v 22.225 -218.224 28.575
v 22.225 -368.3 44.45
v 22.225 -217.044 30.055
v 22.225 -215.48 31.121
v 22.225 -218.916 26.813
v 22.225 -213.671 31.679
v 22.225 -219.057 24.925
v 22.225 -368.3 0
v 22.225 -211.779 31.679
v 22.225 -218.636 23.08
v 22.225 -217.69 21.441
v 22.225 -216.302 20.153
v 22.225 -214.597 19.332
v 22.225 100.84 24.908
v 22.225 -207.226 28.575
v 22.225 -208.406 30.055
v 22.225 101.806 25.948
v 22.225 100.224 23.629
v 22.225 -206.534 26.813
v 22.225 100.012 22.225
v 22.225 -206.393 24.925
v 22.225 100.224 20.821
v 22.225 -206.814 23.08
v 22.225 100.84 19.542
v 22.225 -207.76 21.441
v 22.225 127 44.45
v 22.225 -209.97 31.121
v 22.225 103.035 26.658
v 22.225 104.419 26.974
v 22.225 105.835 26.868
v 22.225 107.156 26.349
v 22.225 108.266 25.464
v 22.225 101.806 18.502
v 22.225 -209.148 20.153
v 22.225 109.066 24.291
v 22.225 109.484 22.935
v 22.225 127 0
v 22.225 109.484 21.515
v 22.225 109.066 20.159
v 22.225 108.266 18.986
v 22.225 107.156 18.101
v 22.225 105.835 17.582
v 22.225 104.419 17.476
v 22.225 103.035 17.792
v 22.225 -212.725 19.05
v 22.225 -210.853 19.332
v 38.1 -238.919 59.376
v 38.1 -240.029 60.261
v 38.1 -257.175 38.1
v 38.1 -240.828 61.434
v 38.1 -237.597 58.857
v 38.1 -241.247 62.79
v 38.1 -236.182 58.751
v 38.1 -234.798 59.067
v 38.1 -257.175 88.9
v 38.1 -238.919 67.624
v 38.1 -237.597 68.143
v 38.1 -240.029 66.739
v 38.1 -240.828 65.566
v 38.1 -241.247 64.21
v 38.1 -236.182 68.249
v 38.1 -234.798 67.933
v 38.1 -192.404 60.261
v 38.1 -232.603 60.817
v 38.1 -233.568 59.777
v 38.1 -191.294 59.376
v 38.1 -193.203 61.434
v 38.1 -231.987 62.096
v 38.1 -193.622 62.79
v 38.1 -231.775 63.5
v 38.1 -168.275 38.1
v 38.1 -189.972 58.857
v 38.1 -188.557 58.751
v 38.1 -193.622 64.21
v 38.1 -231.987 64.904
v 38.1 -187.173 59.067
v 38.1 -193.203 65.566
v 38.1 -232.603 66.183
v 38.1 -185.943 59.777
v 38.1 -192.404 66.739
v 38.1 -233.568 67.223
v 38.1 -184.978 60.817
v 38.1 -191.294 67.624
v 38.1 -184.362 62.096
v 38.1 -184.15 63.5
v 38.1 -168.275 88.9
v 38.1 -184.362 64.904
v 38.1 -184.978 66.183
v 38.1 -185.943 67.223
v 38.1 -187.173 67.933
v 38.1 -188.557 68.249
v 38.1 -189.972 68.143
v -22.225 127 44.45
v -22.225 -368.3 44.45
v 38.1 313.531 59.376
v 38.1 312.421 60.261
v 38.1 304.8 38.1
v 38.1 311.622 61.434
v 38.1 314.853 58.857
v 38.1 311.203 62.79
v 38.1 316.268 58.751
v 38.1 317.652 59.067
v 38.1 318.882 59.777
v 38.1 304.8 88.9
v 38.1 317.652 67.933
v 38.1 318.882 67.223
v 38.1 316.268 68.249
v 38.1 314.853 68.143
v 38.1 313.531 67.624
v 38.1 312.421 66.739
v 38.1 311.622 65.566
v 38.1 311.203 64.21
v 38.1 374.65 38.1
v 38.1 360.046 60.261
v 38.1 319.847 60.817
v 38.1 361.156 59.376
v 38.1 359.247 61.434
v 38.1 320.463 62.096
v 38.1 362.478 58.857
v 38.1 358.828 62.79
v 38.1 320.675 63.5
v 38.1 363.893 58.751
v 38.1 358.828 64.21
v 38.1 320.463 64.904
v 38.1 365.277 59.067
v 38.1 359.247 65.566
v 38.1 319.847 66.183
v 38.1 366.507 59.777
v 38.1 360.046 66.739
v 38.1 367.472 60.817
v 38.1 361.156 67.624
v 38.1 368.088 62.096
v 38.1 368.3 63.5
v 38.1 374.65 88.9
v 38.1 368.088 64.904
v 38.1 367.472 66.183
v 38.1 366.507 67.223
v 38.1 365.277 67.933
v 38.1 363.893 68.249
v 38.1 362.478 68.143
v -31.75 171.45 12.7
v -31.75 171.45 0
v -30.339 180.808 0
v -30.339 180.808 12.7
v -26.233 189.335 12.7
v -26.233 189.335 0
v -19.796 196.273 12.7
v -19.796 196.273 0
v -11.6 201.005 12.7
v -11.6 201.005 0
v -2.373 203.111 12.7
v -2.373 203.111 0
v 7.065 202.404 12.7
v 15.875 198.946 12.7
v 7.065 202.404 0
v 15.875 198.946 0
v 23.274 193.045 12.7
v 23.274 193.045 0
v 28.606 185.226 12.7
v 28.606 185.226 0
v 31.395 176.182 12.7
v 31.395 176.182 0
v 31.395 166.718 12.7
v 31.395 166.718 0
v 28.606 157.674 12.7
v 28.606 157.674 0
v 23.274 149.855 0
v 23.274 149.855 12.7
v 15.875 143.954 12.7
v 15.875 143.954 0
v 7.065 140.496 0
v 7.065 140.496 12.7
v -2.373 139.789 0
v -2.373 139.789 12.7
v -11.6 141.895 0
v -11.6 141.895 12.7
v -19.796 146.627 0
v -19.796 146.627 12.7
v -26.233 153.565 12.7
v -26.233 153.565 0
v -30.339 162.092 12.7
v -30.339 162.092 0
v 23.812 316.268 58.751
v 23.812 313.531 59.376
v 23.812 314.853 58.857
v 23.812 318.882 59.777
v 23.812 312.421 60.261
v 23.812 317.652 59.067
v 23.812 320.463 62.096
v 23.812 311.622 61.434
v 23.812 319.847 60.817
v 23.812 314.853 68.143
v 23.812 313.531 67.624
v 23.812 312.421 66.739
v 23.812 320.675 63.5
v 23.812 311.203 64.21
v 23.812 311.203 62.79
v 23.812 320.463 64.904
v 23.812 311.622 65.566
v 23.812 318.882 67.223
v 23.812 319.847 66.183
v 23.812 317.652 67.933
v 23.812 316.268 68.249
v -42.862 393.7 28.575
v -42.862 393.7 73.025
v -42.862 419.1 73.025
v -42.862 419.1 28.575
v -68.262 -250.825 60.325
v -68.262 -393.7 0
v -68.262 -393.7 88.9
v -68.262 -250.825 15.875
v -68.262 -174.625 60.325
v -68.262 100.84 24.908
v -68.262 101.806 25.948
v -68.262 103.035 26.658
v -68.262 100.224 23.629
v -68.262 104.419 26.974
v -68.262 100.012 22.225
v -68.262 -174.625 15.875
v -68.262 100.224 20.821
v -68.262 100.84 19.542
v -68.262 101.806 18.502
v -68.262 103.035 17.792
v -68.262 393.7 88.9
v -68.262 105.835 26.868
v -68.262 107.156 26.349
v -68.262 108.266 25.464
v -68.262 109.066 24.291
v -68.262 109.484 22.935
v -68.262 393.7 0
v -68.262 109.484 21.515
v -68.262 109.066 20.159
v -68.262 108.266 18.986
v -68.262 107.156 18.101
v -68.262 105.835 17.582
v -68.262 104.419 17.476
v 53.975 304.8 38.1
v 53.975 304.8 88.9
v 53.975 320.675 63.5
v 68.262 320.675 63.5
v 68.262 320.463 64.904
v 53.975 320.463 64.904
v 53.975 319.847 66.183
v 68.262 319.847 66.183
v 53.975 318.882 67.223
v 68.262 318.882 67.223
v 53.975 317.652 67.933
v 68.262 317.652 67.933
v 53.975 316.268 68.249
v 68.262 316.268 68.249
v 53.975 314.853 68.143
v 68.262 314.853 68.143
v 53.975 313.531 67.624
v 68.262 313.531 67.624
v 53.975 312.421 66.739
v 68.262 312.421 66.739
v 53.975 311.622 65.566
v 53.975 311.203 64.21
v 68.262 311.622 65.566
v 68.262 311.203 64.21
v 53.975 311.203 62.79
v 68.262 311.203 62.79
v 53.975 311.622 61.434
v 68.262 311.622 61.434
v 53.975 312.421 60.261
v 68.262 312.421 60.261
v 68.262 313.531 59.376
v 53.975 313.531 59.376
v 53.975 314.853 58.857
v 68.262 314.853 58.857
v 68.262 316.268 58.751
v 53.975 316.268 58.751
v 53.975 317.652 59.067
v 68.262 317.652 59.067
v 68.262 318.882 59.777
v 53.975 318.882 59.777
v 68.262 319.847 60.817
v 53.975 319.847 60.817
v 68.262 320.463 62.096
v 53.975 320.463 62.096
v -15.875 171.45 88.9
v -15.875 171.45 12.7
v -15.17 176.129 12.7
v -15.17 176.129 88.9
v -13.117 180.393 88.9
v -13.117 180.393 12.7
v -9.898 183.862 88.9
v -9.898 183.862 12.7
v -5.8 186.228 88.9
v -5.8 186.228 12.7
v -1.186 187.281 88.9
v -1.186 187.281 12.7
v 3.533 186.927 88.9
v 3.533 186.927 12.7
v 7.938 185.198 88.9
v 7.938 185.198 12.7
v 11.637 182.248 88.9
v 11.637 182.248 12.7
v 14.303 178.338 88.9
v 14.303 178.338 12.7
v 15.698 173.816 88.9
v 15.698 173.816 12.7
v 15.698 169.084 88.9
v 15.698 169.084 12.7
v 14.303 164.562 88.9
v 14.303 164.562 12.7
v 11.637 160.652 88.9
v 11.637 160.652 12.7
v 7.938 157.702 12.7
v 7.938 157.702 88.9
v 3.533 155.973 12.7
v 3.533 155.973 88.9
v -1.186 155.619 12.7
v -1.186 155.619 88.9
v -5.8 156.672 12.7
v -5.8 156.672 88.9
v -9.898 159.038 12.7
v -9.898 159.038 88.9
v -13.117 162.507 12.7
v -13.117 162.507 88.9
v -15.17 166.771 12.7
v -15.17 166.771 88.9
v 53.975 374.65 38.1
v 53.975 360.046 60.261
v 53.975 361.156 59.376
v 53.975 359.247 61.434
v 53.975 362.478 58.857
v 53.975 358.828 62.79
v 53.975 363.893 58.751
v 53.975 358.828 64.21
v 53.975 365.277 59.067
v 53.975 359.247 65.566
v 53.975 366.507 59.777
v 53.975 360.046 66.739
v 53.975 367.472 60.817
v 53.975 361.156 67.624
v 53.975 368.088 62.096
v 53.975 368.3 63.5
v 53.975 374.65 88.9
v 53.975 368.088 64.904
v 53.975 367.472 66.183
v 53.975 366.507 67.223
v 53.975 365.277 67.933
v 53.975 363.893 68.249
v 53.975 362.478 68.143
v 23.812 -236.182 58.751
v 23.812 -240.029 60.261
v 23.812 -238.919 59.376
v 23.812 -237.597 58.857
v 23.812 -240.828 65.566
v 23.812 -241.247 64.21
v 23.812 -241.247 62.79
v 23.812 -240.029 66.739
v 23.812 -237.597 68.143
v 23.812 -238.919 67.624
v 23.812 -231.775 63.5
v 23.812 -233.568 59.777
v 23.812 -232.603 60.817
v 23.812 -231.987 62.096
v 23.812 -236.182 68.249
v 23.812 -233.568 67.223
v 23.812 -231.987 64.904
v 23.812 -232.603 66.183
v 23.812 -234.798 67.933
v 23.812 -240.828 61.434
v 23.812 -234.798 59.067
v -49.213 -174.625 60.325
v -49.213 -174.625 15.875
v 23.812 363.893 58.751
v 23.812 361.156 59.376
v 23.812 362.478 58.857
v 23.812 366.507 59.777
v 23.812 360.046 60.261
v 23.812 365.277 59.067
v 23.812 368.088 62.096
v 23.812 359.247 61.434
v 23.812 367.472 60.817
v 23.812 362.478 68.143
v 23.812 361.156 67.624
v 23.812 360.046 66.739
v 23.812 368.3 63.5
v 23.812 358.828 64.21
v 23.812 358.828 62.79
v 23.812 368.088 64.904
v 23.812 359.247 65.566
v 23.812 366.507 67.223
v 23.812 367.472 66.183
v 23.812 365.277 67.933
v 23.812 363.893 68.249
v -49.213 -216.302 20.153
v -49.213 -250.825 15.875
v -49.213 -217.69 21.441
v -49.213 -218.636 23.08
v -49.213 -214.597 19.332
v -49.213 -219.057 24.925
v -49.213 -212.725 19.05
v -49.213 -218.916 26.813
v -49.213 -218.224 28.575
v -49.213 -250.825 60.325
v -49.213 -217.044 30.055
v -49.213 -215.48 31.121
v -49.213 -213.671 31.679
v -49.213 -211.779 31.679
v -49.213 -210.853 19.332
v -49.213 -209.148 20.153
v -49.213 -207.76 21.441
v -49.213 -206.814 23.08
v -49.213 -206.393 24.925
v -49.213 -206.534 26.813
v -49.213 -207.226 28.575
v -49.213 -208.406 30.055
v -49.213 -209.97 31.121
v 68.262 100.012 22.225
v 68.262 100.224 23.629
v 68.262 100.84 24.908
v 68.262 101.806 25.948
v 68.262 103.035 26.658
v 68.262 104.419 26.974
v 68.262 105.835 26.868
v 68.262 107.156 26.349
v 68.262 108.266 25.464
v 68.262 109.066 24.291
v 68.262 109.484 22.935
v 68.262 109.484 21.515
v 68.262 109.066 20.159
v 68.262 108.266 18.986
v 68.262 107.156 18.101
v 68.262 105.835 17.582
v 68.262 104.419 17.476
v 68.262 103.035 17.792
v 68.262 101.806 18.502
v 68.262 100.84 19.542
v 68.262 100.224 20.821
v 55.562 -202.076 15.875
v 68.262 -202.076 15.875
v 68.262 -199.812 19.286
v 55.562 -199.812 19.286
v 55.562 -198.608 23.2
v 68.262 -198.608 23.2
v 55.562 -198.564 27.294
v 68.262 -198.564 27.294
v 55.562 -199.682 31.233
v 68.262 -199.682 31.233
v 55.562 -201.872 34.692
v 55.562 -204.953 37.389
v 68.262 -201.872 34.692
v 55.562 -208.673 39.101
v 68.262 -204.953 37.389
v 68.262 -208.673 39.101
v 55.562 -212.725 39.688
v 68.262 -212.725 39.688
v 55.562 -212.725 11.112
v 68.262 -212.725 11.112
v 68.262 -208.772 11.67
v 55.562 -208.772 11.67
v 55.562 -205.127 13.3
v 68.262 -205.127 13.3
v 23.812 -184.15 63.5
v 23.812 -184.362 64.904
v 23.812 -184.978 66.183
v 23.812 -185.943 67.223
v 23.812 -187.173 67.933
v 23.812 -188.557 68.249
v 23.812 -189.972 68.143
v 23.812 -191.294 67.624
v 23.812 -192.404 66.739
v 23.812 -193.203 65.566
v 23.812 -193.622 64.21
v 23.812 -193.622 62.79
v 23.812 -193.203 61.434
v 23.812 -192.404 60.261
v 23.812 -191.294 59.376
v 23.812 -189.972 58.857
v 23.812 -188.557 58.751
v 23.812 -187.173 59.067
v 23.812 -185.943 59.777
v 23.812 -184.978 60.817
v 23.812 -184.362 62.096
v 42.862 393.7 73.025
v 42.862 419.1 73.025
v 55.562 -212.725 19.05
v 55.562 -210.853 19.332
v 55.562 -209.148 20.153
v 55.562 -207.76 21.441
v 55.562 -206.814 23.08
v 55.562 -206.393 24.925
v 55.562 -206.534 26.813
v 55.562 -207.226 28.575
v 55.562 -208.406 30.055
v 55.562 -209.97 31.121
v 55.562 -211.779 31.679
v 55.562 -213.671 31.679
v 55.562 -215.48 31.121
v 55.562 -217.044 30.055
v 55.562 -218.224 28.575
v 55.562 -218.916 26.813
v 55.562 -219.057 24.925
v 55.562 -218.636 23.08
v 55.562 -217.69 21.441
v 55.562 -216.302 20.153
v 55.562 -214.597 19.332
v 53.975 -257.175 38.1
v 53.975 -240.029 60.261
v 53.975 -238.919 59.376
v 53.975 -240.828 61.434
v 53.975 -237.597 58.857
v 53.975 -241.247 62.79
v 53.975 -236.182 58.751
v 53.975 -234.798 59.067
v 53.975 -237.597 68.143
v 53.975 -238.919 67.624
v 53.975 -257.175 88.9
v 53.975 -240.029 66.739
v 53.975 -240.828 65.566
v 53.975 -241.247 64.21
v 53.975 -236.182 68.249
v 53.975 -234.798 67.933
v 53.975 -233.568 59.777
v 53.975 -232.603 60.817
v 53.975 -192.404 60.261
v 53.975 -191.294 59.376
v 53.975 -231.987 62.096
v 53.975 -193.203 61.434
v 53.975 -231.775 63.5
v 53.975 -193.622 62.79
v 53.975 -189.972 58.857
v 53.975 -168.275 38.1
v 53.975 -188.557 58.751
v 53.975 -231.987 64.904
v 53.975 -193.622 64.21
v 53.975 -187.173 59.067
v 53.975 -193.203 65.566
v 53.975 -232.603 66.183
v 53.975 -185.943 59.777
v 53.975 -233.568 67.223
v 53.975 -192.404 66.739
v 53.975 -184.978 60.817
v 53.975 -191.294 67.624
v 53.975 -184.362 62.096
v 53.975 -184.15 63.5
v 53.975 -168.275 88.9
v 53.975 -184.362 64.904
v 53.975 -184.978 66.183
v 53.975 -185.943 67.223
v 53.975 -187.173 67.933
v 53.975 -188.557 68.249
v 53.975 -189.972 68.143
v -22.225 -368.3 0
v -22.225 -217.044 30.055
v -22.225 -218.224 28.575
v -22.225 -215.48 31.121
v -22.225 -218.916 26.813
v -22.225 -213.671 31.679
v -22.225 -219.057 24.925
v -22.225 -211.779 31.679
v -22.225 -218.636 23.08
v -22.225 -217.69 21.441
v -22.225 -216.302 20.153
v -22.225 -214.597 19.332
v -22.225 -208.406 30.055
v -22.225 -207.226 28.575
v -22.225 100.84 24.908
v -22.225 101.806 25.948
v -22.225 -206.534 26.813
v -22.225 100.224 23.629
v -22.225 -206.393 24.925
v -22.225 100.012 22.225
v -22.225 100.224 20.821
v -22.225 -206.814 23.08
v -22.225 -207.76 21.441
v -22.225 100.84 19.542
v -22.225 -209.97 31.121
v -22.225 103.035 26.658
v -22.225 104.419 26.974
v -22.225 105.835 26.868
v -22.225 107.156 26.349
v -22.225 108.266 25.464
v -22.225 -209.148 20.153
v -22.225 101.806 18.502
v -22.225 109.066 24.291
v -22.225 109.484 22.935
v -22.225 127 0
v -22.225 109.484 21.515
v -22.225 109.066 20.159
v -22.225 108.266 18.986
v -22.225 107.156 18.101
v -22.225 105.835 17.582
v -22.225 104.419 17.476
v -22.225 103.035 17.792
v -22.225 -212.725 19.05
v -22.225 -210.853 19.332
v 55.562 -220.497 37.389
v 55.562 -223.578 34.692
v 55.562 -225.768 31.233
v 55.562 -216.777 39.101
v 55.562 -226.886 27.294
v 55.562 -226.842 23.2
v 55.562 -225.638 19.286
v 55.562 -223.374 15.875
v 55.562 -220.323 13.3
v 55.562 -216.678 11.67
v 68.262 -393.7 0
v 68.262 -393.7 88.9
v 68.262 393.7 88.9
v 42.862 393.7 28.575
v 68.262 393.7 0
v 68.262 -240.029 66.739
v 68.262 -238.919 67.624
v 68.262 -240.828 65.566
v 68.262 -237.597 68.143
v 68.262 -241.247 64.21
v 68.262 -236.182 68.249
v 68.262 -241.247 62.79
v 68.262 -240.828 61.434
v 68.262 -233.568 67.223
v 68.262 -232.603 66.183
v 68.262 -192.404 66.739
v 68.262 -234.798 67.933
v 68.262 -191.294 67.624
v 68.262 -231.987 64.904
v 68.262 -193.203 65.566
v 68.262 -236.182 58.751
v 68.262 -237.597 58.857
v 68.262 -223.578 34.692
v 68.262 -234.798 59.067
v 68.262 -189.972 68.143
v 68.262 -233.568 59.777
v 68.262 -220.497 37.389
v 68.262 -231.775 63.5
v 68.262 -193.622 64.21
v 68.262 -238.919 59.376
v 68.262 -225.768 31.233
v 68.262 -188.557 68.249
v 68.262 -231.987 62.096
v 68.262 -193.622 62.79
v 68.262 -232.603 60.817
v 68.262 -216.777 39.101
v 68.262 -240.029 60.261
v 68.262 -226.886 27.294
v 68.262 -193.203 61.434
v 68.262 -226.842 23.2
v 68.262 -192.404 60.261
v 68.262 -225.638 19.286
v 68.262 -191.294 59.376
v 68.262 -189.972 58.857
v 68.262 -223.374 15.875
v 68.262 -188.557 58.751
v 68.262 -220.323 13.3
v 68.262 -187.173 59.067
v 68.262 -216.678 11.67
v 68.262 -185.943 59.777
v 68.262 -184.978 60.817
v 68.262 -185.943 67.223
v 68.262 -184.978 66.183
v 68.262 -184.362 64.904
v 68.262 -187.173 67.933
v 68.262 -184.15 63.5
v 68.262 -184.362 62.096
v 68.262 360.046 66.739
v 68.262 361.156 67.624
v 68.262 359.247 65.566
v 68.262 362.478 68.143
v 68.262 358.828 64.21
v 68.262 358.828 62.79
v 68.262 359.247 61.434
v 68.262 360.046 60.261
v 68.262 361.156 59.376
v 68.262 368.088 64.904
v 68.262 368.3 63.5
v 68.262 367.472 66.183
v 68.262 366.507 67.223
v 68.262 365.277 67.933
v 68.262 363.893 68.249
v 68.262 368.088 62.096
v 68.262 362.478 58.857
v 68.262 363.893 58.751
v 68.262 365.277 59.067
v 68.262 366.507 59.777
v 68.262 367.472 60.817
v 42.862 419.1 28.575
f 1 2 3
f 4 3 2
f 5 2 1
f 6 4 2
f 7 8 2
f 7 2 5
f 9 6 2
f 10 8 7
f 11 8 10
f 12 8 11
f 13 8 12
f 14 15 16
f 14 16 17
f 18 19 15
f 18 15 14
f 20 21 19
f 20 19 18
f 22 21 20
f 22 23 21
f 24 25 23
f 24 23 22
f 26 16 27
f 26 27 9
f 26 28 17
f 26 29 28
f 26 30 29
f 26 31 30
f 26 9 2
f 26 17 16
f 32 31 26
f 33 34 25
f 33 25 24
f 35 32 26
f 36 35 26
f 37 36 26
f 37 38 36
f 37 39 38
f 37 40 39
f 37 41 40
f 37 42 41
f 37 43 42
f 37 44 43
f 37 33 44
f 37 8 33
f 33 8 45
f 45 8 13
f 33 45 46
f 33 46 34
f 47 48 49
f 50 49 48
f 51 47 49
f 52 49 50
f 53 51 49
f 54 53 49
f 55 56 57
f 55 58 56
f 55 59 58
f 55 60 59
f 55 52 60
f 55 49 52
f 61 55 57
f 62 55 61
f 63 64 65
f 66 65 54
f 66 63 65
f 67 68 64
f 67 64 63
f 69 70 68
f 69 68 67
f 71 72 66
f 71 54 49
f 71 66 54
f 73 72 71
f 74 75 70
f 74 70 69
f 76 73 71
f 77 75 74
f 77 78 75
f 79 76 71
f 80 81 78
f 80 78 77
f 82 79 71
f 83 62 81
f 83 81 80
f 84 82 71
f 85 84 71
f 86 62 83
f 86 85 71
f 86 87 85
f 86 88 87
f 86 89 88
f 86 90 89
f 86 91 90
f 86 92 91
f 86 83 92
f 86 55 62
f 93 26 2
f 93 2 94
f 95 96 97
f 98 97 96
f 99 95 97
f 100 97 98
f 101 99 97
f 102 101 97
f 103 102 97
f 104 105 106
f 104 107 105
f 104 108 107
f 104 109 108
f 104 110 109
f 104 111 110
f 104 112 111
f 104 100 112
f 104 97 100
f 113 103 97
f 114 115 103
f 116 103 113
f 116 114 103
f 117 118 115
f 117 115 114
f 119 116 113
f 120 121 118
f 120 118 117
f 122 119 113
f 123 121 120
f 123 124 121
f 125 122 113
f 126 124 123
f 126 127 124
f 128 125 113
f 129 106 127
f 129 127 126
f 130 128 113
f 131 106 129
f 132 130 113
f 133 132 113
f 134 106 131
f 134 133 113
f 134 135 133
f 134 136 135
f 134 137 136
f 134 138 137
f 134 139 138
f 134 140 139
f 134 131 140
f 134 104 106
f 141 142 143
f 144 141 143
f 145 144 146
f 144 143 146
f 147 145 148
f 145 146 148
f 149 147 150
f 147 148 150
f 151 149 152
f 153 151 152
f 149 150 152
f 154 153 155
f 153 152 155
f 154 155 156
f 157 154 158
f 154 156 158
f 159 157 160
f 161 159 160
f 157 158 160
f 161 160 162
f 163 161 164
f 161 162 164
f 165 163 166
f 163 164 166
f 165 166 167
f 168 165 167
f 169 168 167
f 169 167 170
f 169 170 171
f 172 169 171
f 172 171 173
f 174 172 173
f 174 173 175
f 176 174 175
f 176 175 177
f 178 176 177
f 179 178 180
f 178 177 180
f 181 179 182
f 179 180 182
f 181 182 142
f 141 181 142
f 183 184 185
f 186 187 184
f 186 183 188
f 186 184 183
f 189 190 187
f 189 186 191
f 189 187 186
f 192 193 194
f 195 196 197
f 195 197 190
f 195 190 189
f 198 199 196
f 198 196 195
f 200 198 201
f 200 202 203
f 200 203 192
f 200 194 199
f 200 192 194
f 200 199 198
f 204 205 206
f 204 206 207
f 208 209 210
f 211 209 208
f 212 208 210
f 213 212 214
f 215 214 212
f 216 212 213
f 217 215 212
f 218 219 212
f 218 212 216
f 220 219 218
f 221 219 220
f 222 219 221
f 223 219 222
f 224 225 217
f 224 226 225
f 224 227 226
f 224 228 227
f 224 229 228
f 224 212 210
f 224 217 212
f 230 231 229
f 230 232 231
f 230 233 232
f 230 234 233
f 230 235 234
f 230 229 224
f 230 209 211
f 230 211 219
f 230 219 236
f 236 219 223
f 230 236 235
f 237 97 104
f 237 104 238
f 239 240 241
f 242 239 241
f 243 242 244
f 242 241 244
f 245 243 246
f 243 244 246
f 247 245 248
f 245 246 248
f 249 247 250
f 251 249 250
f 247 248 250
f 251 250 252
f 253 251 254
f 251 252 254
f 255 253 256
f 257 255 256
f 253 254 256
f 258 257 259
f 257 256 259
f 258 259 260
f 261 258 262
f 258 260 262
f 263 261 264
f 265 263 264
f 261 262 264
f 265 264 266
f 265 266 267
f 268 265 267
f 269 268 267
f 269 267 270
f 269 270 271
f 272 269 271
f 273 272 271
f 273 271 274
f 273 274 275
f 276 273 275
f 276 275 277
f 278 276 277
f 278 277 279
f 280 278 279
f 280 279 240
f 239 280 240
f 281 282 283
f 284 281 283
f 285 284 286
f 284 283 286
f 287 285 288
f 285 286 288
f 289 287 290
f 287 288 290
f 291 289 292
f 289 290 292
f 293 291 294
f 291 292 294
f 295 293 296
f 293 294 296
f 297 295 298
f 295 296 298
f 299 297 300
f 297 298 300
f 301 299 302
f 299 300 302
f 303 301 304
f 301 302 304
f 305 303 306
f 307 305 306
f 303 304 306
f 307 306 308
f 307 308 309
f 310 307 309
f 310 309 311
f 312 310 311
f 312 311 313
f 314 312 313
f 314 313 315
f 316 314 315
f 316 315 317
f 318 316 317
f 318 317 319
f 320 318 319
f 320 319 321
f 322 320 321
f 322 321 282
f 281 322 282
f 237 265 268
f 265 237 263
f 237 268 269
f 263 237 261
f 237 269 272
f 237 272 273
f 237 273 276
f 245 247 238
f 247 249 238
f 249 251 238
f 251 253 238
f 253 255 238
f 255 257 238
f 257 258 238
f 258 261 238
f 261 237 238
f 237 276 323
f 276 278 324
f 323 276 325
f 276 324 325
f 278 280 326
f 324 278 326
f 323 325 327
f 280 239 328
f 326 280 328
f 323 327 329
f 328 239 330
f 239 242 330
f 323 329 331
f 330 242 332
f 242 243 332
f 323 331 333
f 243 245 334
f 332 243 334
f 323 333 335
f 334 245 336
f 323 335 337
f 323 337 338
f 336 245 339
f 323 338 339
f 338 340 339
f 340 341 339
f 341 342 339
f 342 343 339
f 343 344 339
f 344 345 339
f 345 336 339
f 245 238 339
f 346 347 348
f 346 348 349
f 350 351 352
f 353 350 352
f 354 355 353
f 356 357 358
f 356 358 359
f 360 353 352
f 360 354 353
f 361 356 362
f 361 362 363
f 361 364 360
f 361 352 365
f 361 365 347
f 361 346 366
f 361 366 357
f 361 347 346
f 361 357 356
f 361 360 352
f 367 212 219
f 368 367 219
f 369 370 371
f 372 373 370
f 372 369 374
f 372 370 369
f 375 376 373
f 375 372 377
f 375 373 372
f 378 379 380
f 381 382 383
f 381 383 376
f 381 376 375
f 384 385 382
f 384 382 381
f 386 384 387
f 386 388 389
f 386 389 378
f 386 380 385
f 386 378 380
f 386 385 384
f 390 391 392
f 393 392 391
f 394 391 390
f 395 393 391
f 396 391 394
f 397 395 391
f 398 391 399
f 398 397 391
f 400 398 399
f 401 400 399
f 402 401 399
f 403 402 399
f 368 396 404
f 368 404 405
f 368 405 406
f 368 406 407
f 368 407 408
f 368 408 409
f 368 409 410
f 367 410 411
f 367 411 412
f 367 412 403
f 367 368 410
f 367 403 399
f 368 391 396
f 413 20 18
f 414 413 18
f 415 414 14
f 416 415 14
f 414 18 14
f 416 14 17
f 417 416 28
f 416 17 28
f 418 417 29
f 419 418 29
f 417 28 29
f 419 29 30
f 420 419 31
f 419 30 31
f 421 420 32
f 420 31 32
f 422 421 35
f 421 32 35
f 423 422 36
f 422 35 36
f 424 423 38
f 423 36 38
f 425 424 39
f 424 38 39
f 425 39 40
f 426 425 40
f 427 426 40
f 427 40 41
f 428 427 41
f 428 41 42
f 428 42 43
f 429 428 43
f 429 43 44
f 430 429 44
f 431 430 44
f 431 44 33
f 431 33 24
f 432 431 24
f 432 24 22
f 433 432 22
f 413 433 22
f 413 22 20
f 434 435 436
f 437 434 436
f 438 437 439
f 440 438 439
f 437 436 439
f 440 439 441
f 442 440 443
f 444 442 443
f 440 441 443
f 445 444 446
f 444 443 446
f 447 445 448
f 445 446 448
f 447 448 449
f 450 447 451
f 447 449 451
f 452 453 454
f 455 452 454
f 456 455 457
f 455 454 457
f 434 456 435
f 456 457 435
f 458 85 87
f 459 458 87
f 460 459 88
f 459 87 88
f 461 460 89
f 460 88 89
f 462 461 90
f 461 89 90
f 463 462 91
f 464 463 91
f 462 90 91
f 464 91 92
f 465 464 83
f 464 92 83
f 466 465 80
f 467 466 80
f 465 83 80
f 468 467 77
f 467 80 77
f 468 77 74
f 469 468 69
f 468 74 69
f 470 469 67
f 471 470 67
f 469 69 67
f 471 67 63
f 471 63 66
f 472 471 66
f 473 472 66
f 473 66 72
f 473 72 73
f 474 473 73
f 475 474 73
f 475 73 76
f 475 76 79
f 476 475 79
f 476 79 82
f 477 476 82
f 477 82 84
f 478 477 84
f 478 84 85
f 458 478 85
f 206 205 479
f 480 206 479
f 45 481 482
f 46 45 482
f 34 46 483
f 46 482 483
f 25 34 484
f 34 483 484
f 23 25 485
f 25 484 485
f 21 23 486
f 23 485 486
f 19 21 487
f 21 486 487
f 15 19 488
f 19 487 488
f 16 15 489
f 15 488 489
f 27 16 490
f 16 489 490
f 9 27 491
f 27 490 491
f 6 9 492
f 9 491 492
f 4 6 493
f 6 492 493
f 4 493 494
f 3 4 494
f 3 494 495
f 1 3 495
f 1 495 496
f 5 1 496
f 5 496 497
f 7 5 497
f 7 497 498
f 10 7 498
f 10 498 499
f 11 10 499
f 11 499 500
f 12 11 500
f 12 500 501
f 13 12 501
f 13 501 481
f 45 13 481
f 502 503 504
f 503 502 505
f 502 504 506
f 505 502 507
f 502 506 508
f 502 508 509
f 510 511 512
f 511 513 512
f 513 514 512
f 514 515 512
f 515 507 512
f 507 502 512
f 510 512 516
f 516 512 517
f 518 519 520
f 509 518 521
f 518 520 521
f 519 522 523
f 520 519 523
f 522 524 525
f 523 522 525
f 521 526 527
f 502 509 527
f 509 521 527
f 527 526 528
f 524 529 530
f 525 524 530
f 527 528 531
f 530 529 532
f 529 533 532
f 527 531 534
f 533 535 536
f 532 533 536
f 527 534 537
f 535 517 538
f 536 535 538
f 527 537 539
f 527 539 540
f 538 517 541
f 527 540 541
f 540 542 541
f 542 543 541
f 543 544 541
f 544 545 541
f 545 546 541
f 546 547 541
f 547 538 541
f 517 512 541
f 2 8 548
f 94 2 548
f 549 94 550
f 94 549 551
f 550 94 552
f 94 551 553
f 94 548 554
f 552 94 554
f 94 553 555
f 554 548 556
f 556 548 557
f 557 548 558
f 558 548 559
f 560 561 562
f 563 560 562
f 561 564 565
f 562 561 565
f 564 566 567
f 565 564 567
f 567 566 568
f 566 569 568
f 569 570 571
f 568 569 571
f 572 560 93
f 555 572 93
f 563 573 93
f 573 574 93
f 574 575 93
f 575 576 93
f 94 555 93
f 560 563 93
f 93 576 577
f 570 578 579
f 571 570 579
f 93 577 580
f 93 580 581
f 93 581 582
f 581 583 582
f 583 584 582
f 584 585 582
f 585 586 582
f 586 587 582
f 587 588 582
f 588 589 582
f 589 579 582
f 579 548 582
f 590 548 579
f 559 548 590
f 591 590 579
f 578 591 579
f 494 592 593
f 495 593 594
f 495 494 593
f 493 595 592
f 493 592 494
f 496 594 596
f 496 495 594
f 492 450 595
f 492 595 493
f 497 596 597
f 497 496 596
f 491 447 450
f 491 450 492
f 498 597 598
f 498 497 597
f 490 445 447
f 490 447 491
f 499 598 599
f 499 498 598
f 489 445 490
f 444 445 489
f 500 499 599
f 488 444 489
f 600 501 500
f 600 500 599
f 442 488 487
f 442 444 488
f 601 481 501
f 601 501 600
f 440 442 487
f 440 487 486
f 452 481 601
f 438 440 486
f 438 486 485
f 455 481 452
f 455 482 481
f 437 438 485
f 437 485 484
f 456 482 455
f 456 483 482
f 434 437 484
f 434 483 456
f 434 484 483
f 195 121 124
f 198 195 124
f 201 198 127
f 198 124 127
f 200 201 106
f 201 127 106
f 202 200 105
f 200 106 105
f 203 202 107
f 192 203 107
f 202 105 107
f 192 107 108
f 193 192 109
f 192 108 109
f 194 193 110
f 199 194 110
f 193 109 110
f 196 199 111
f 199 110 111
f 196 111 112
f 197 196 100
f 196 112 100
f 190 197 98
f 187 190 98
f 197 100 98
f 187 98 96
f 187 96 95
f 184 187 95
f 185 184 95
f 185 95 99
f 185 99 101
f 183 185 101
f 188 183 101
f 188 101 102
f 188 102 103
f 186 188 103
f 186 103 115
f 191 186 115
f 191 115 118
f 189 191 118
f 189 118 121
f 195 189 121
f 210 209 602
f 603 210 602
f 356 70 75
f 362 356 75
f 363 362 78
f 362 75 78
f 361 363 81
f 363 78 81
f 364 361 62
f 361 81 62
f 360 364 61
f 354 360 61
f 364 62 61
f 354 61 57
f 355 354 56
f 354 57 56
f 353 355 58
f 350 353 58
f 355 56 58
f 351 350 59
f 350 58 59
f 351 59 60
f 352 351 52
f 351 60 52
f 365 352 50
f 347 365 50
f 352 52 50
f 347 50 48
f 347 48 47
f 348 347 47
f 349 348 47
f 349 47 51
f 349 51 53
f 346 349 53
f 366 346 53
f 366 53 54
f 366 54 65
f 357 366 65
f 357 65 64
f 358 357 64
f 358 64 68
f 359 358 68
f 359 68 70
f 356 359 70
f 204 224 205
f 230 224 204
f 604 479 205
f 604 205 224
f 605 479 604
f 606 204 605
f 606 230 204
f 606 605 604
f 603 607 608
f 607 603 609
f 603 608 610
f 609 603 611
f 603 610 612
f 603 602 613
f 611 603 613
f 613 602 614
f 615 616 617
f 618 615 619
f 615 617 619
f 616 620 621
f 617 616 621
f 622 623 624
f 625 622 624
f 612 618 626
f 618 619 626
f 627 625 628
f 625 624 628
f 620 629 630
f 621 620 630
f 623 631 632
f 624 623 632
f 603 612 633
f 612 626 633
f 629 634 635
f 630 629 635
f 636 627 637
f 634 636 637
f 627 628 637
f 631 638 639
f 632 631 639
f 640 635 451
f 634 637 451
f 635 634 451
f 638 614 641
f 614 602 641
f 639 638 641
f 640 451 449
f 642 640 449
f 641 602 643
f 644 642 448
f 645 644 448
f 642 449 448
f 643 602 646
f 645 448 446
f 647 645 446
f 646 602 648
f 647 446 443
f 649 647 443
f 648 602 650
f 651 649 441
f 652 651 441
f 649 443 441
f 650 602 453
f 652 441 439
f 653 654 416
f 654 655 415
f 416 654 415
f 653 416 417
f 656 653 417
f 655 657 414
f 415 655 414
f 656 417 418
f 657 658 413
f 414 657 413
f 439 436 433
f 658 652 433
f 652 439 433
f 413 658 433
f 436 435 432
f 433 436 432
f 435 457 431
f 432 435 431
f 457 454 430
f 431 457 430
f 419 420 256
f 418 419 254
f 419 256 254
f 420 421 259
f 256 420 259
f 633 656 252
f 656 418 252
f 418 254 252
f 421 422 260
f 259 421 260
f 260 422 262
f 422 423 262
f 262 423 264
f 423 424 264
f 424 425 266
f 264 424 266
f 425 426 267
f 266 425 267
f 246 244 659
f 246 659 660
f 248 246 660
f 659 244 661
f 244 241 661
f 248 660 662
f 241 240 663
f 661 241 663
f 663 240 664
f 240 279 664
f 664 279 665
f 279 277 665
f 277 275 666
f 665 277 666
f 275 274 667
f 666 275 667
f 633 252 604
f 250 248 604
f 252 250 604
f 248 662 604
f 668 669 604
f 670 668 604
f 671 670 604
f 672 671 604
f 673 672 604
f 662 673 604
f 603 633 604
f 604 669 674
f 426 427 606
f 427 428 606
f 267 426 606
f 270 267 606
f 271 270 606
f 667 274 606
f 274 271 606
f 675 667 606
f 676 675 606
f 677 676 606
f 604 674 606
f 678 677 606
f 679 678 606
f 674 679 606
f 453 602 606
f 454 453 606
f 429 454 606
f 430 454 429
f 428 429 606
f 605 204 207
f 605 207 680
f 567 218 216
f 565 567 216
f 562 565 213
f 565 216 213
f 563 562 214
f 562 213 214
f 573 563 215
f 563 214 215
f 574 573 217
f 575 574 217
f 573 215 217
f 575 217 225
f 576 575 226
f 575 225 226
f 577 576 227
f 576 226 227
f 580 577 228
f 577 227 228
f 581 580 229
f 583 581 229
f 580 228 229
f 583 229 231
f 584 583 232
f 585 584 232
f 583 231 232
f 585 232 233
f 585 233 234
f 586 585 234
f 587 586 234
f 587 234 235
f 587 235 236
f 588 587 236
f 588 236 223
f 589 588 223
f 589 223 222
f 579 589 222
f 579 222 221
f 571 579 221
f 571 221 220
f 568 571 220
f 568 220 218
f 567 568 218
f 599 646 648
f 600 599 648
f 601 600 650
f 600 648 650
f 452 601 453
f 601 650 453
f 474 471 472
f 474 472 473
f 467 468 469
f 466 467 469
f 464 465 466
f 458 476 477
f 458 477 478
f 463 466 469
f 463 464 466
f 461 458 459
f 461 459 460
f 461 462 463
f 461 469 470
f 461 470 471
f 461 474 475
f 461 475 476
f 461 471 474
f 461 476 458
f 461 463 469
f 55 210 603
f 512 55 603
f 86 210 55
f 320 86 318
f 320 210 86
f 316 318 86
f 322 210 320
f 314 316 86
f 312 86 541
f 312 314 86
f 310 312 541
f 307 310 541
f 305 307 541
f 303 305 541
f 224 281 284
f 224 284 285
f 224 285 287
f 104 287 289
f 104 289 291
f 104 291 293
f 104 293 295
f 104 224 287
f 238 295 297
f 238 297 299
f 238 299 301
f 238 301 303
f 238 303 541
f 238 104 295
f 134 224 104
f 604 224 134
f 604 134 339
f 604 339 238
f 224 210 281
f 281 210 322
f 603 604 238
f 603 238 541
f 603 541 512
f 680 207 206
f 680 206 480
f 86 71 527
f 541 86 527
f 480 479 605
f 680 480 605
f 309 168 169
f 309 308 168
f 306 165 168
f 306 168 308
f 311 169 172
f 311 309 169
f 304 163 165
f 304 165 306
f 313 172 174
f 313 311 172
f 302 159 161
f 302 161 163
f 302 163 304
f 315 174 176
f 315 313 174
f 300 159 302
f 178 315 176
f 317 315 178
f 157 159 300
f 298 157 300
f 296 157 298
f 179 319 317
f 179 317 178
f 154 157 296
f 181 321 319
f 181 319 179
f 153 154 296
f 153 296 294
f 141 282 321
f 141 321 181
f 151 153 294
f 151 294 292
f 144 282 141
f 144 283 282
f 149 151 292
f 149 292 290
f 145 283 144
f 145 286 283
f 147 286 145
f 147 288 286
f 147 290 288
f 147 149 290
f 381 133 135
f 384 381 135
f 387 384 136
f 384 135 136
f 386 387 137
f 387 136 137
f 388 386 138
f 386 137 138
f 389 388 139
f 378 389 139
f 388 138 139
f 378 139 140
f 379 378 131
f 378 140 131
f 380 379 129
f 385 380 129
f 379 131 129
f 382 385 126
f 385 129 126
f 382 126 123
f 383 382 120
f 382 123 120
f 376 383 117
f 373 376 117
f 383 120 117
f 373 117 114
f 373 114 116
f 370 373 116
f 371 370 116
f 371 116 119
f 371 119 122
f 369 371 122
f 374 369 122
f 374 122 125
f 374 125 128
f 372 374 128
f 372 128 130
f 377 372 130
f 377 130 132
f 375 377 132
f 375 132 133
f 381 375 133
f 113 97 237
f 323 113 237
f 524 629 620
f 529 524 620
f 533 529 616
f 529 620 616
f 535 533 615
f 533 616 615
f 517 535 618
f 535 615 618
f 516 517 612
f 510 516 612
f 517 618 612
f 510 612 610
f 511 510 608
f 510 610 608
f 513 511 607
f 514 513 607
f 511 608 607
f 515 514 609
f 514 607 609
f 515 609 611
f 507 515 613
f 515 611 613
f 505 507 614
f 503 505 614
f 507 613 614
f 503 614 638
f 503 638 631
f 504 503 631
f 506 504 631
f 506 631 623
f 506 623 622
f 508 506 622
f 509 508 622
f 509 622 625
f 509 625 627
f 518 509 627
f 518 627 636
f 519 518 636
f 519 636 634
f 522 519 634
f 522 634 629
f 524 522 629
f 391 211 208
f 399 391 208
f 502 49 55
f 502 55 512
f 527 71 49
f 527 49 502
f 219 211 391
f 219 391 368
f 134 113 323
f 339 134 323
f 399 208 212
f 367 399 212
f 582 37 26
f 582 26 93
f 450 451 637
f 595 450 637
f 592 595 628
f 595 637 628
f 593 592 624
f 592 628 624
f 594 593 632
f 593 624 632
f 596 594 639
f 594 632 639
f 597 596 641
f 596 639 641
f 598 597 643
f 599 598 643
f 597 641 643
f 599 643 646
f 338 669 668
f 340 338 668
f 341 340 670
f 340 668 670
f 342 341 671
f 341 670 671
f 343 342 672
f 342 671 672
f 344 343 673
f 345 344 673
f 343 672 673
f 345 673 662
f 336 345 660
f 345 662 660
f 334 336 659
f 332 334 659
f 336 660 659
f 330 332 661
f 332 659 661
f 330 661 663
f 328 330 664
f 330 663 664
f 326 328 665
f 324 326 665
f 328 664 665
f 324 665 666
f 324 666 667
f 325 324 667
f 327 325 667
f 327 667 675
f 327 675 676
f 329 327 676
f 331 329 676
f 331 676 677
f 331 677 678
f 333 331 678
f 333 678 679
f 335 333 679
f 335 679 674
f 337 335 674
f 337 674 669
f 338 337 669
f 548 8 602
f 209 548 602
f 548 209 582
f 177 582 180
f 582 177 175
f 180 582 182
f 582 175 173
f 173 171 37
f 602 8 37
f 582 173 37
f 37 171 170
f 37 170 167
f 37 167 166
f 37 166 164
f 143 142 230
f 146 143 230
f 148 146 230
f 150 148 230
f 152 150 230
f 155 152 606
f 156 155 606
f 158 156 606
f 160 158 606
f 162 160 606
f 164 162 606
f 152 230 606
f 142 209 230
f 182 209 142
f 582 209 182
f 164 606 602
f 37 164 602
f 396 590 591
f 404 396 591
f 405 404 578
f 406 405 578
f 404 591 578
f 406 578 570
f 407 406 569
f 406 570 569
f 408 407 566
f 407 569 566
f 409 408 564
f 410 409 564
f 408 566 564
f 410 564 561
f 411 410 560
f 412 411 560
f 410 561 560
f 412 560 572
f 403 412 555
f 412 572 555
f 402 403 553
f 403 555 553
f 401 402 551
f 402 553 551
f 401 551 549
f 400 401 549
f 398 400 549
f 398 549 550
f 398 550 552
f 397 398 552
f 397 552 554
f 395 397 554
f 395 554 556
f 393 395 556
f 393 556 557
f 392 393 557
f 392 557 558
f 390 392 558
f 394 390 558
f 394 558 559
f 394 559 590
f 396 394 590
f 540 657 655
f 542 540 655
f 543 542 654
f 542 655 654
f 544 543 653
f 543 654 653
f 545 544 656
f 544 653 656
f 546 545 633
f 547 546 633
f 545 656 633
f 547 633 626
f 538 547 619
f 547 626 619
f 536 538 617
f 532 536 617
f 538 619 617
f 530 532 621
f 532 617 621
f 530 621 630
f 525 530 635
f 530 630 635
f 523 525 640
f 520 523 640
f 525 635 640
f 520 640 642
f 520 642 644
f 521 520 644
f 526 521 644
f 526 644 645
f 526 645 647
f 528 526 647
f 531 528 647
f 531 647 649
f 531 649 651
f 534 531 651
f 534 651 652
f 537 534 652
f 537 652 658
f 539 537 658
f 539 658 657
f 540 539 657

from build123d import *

# Parameters (mm, degrees)
SKETCH1_W           = 136.525
SKETCH1_H           = 787.4
BOSS_EXTRUDE1_DEPTH = 88.9
SKETCH2_W           = 85.725
SKETCH2_H           = 44.45
BOSS_EXTRUDE2_DEPTH = 25.4
SKETCH4_W           = 44.45
SKETCH4_H           = 495.3
CUT_EXTRUDE1_DEPTH  = 44.45
SKETCH4_3_R         = 31.75
SKETCH4_3_R_2       = 15.875
CUT_EXTRUDE2_DEPTH  = 12.7
SKETCH4_4_R         = 15.875
CUT_EXTRUDE3_DEPTH  = 434.829216289
SKETCH5_W           = 44.45
SKETCH5_H           = 76.2
CUT_EXTRUDE4_DEPTH  = 19.05
SKETCH5_3_R         = 4.7625
CUT_EXTRUDE5_DEPTH  = 450.652194062
SKETCH6_W           = 15.875
SKETCH6_H           = 88.9
SKETCH6_H_2         = 69.85
CUT_EXTRUDE6_DEPTH  = 50.8
SKETCH7_R           = 4.7625
CUT_EXTRUDE7_DEPTH  = 44.45
SKETCH8_R           = 14.2875
SKETCH8_R_2         = 6.35
CUT_EXTRUDE8_DEPTH  = 12.7
SKETCH8_3_R         = 6.35
CUT_EXTRUDE9_DEPTH  = 450.652194062


with BuildPart() as part:
    # Sketch1 → Boss-Extrude1 (new body)
    with BuildSketch(Plane.XY):
        Rectangle(SKETCH1_W, SKETCH1_H)
    extrude(amount=BOSS_EXTRUDE1_DEPTH)

    # Sketch2 → Boss-Extrude2 (add)
    with BuildSketch(Plane(origin=(0, 393.7, 0), x_dir=(1, 0, 0), z_dir=(0, 1, 0))):
        with Locations((0, -50.8)):
            Rectangle(SKETCH2_W, SKETCH2_H)
    extrude(amount=BOSS_EXTRUDE2_DEPTH)

    # Sketch4 → Cut-Extrude1 (cut)
    with BuildSketch(Plane(origin=(0, 0, 0), x_dir=(-1, 0, 0), z_dir=(0, 0, -1))):
        with Locations((0, -120.65)):
            Rectangle(SKETCH4_W, SKETCH4_H)
    extrude(amount=-CUT_EXTRUDE1_DEPTH, mode=Mode.SUBTRACT)

    # Sketch4<3> → Cut-Extrude2 (cut)
    with BuildSketch(Plane(origin=(0, 0, 0), x_dir=(-1, 0, 0), z_dir=(0, 0, -1))):
        with Locations((0, 171.45)):
            Circle(SKETCH4_3_R)
        with Locations((0, 171.45)):
            Circle(SKETCH4_3_R_2, mode=Mode.SUBTRACT)
    extrude(amount=-CUT_EXTRUDE2_DEPTH, mode=Mode.SUBTRACT)

    # Sketch4<4> → Cut-Extrude3 (cut, through all)
    with BuildSketch(Plane(origin=(0, 0, 0), x_dir=(-1, 0, 0), z_dir=(0, 0, -1))):
        with Locations((0, 171.45)):
            Circle(SKETCH4_4_R)
    extrude(amount=-CUT_EXTRUDE3_DEPTH, mode=Mode.SUBTRACT)

    # Sketch5 → Cut-Extrude4 (cut)
    with BuildSketch(Plane.ZY.offset(68.2625)):
        with Locations((38.1, -212.725)):
            Rectangle(SKETCH5_W, SKETCH5_H)
    extrude(amount=-CUT_EXTRUDE4_DEPTH, mode=Mode.SUBTRACT)

    # Sketch5<3> → Cut-Extrude5 (cut, through all)
    with BuildSketch(Plane.ZY.offset(68.2625)):
        with Locations((22.225, 104.775)):
            Circle(SKETCH5_3_R)
    extrude(amount=-CUT_EXTRUDE5_DEPTH, mode=Mode.SUBTRACT)

    # Sketch6 → Cut-Extrude6 (cut)
    with BuildSketch(Plane.XY.offset(88.9)):
        with Locations((46.0375, -212.725)):
            Rectangle(SKETCH6_W, SKETCH6_H)
        with Locations((46.0375, 339.725)):
            Rectangle(SKETCH6_W, SKETCH6_H_2)
    extrude(amount=-CUT_EXTRUDE6_DEPTH, mode=Mode.SUBTRACT)

    # Sketch7 → Cut-Extrude7 (cut)
    with BuildSketch(Plane(origin=(68.2625, 0, 0), x_dir=(0, 0, -1), z_dir=(1, 0, 0))):
        with Locations((-63.5, -188.9125)):
            Circle(SKETCH7_R)
        with Locations((-63.5, -236.5375)):
            Circle(SKETCH7_R)
        with Locations((-63.5, 363.5375)):
            Circle(SKETCH7_R)
        with Locations((-63.5, 315.9125)):
            Circle(SKETCH7_R)
    extrude(amount=-CUT_EXTRUDE7_DEPTH, mode=Mode.SUBTRACT)

    # Sketch8 → Cut-Extrude8 (cut)
    with BuildSketch(Plane(origin=(68.2625, 0, 0), x_dir=(0, 0, -1), z_dir=(1, 0, 0))):
        with Locations((-25.4, -212.725)):
            Circle(SKETCH8_R)
        with Locations((-25.4, -212.725)):
            Circle(SKETCH8_R_2, mode=Mode.SUBTRACT)
    extrude(amount=-CUT_EXTRUDE8_DEPTH, mode=Mode.SUBTRACT)

    # Sketch8<3> → Cut-Extrude9 (cut, through all)
    with BuildSketch(Plane(origin=(68.2625, 0, 0), x_dir=(0, 0, -1), z_dir=(1, 0, 0))):
        with Locations((-25.4, -212.725)):
            Circle(SKETCH8_3_R)
    extrude(amount=-CUT_EXTRUDE9_DEPTH, mode=Mode.SUBTRACT)


solid = part.part
